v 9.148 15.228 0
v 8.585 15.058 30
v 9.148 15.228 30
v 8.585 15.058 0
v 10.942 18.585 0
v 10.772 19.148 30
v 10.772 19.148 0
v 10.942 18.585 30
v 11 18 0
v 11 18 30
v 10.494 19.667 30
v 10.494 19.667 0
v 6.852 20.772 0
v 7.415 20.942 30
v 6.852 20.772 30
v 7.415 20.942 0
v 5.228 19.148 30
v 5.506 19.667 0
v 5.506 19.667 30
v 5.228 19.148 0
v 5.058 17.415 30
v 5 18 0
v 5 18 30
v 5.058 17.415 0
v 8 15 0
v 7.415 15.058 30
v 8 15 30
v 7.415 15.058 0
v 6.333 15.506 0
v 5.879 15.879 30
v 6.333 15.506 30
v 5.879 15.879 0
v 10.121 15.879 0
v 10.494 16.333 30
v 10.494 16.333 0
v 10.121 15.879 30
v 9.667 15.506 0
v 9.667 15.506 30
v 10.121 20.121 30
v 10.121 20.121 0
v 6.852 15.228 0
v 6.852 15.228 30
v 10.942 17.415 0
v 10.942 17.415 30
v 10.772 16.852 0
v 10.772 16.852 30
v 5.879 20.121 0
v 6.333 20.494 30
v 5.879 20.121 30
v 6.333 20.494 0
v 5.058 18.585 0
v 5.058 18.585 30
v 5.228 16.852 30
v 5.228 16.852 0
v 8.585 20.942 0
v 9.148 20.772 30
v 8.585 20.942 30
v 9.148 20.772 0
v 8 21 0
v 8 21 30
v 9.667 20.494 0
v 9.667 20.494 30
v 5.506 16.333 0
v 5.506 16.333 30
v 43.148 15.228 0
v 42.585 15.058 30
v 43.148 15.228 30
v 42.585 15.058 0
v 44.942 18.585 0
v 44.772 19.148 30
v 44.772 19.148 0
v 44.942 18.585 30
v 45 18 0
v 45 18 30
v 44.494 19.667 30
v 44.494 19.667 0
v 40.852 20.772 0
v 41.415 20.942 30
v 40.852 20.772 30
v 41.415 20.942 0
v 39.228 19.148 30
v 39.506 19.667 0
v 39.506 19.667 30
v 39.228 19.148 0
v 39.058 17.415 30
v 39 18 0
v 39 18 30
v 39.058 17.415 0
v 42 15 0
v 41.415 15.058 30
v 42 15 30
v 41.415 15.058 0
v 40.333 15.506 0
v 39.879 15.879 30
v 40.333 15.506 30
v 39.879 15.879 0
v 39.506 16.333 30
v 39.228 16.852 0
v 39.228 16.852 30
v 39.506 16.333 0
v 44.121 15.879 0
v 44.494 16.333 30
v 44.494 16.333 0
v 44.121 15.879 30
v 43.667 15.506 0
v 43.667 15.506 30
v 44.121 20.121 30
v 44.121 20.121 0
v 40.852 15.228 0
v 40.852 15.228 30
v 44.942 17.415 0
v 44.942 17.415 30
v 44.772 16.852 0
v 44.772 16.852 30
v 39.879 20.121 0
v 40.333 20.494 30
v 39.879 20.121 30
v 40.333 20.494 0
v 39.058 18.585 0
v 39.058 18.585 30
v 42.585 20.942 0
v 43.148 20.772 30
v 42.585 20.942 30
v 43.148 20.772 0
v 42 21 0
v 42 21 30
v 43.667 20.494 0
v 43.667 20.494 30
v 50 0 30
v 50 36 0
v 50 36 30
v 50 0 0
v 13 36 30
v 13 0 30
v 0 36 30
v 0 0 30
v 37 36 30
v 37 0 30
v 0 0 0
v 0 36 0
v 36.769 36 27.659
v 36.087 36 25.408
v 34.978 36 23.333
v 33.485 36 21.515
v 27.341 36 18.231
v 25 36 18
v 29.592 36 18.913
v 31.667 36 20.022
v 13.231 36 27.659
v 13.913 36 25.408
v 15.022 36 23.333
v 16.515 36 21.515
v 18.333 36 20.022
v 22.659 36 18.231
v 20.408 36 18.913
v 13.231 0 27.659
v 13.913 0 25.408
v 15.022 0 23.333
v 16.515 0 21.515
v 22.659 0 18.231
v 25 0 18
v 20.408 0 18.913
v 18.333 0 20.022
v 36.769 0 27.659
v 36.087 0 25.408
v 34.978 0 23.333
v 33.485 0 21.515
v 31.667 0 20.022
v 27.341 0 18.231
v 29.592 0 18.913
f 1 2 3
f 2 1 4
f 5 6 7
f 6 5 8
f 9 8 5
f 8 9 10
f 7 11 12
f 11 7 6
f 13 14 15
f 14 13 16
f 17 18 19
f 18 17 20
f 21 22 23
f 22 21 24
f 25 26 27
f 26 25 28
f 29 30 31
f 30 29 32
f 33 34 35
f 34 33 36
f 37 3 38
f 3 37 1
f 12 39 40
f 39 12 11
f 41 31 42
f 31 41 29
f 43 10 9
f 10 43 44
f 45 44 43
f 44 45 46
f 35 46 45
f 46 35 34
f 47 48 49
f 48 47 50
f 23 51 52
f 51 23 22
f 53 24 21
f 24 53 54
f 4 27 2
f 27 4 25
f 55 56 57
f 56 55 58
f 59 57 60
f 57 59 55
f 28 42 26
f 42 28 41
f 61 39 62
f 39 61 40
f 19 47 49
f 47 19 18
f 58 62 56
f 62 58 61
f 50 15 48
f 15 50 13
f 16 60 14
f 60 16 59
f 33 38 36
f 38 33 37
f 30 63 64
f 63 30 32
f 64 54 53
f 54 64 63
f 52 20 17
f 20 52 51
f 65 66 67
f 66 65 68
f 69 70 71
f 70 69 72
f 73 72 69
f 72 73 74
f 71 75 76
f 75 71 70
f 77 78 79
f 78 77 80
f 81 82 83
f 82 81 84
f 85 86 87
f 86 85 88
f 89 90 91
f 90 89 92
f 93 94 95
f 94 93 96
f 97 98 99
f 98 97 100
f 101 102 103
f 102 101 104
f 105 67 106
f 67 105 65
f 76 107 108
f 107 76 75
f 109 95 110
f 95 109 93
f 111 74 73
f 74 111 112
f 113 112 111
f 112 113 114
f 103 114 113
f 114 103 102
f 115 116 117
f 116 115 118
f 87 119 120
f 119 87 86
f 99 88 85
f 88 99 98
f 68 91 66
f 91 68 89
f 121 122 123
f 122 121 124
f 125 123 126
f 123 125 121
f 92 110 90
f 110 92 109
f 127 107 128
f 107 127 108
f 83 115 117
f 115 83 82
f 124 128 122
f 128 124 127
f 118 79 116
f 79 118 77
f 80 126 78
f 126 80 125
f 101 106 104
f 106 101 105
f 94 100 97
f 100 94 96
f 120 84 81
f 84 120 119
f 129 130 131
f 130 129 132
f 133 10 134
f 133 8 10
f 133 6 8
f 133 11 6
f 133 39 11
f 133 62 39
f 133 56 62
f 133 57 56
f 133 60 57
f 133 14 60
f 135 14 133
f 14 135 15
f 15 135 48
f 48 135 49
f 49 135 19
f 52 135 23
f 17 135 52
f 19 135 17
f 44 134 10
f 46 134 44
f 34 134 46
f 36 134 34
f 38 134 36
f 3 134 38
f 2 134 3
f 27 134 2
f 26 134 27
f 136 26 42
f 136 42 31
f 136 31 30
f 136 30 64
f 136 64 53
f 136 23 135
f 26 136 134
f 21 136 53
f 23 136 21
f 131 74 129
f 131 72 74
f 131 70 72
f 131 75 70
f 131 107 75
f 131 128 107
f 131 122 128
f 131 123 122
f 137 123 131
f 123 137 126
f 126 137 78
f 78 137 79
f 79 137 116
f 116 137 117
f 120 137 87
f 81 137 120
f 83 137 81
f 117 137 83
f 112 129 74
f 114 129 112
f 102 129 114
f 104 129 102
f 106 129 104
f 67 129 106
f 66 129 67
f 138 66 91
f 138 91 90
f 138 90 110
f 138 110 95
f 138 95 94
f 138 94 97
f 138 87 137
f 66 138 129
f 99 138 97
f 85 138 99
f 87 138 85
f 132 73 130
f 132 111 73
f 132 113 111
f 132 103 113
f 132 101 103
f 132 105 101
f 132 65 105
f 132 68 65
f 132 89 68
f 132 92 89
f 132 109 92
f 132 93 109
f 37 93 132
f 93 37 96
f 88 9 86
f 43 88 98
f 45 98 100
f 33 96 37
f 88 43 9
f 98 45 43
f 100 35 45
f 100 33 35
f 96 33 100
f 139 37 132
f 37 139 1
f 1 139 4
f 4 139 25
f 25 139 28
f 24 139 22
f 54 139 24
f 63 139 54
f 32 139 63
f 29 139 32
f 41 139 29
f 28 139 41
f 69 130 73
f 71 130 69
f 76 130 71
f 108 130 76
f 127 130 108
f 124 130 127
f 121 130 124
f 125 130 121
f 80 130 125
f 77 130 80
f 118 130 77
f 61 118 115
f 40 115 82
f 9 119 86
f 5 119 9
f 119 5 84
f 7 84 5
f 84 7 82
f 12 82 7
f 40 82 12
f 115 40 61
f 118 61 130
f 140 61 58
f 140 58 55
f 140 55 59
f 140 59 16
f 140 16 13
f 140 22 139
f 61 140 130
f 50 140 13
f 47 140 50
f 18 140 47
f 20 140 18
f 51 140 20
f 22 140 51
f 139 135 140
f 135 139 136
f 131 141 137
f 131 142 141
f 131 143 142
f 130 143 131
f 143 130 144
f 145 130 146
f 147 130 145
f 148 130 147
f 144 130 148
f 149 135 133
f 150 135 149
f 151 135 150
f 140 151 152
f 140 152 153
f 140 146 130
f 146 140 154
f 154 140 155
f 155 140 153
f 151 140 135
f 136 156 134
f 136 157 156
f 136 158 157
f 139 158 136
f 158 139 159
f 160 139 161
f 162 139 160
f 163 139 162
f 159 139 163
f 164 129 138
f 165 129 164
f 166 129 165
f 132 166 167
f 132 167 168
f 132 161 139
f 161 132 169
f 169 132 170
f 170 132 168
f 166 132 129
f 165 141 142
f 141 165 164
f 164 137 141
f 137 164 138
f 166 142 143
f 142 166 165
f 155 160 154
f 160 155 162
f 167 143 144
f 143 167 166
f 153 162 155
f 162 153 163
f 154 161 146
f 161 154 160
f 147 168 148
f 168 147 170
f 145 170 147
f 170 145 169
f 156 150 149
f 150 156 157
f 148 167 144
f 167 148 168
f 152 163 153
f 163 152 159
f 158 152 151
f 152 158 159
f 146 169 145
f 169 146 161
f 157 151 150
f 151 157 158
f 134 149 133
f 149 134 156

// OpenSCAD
$fn = 32;

// ----------------------------------------------------------------------
// Saddle clamp: plain shaft clamp
// ----------------------------------------------------------------------

// --- parameters (mm) ---
blk_l = 50;               // block length, X
blk_w = 36;               // block width, Y
blk_h = 30;               // block height
clamp_r = 12;             // shaft groove radius
hole_r = 3;               // bolt hole radius
hole_m = 8;               // bolt hole margin from the ends

saw_depth = clamp_r + 3;  // saw kerf depth

difference() {
  cube([blk_l, blk_w, blk_h]);
  translate([blk_l / 2, -1, blk_h])
    rotate([-90, 0, 0])
      cylinder(h = blk_w + 2, r = clamp_r);
  for (sx = [0, 1])
    translate([sx ? blk_l - hole_m : hole_m, blk_w / 2, -1])
      cylinder(r = hole_r, h = blk_h + 2);
}
